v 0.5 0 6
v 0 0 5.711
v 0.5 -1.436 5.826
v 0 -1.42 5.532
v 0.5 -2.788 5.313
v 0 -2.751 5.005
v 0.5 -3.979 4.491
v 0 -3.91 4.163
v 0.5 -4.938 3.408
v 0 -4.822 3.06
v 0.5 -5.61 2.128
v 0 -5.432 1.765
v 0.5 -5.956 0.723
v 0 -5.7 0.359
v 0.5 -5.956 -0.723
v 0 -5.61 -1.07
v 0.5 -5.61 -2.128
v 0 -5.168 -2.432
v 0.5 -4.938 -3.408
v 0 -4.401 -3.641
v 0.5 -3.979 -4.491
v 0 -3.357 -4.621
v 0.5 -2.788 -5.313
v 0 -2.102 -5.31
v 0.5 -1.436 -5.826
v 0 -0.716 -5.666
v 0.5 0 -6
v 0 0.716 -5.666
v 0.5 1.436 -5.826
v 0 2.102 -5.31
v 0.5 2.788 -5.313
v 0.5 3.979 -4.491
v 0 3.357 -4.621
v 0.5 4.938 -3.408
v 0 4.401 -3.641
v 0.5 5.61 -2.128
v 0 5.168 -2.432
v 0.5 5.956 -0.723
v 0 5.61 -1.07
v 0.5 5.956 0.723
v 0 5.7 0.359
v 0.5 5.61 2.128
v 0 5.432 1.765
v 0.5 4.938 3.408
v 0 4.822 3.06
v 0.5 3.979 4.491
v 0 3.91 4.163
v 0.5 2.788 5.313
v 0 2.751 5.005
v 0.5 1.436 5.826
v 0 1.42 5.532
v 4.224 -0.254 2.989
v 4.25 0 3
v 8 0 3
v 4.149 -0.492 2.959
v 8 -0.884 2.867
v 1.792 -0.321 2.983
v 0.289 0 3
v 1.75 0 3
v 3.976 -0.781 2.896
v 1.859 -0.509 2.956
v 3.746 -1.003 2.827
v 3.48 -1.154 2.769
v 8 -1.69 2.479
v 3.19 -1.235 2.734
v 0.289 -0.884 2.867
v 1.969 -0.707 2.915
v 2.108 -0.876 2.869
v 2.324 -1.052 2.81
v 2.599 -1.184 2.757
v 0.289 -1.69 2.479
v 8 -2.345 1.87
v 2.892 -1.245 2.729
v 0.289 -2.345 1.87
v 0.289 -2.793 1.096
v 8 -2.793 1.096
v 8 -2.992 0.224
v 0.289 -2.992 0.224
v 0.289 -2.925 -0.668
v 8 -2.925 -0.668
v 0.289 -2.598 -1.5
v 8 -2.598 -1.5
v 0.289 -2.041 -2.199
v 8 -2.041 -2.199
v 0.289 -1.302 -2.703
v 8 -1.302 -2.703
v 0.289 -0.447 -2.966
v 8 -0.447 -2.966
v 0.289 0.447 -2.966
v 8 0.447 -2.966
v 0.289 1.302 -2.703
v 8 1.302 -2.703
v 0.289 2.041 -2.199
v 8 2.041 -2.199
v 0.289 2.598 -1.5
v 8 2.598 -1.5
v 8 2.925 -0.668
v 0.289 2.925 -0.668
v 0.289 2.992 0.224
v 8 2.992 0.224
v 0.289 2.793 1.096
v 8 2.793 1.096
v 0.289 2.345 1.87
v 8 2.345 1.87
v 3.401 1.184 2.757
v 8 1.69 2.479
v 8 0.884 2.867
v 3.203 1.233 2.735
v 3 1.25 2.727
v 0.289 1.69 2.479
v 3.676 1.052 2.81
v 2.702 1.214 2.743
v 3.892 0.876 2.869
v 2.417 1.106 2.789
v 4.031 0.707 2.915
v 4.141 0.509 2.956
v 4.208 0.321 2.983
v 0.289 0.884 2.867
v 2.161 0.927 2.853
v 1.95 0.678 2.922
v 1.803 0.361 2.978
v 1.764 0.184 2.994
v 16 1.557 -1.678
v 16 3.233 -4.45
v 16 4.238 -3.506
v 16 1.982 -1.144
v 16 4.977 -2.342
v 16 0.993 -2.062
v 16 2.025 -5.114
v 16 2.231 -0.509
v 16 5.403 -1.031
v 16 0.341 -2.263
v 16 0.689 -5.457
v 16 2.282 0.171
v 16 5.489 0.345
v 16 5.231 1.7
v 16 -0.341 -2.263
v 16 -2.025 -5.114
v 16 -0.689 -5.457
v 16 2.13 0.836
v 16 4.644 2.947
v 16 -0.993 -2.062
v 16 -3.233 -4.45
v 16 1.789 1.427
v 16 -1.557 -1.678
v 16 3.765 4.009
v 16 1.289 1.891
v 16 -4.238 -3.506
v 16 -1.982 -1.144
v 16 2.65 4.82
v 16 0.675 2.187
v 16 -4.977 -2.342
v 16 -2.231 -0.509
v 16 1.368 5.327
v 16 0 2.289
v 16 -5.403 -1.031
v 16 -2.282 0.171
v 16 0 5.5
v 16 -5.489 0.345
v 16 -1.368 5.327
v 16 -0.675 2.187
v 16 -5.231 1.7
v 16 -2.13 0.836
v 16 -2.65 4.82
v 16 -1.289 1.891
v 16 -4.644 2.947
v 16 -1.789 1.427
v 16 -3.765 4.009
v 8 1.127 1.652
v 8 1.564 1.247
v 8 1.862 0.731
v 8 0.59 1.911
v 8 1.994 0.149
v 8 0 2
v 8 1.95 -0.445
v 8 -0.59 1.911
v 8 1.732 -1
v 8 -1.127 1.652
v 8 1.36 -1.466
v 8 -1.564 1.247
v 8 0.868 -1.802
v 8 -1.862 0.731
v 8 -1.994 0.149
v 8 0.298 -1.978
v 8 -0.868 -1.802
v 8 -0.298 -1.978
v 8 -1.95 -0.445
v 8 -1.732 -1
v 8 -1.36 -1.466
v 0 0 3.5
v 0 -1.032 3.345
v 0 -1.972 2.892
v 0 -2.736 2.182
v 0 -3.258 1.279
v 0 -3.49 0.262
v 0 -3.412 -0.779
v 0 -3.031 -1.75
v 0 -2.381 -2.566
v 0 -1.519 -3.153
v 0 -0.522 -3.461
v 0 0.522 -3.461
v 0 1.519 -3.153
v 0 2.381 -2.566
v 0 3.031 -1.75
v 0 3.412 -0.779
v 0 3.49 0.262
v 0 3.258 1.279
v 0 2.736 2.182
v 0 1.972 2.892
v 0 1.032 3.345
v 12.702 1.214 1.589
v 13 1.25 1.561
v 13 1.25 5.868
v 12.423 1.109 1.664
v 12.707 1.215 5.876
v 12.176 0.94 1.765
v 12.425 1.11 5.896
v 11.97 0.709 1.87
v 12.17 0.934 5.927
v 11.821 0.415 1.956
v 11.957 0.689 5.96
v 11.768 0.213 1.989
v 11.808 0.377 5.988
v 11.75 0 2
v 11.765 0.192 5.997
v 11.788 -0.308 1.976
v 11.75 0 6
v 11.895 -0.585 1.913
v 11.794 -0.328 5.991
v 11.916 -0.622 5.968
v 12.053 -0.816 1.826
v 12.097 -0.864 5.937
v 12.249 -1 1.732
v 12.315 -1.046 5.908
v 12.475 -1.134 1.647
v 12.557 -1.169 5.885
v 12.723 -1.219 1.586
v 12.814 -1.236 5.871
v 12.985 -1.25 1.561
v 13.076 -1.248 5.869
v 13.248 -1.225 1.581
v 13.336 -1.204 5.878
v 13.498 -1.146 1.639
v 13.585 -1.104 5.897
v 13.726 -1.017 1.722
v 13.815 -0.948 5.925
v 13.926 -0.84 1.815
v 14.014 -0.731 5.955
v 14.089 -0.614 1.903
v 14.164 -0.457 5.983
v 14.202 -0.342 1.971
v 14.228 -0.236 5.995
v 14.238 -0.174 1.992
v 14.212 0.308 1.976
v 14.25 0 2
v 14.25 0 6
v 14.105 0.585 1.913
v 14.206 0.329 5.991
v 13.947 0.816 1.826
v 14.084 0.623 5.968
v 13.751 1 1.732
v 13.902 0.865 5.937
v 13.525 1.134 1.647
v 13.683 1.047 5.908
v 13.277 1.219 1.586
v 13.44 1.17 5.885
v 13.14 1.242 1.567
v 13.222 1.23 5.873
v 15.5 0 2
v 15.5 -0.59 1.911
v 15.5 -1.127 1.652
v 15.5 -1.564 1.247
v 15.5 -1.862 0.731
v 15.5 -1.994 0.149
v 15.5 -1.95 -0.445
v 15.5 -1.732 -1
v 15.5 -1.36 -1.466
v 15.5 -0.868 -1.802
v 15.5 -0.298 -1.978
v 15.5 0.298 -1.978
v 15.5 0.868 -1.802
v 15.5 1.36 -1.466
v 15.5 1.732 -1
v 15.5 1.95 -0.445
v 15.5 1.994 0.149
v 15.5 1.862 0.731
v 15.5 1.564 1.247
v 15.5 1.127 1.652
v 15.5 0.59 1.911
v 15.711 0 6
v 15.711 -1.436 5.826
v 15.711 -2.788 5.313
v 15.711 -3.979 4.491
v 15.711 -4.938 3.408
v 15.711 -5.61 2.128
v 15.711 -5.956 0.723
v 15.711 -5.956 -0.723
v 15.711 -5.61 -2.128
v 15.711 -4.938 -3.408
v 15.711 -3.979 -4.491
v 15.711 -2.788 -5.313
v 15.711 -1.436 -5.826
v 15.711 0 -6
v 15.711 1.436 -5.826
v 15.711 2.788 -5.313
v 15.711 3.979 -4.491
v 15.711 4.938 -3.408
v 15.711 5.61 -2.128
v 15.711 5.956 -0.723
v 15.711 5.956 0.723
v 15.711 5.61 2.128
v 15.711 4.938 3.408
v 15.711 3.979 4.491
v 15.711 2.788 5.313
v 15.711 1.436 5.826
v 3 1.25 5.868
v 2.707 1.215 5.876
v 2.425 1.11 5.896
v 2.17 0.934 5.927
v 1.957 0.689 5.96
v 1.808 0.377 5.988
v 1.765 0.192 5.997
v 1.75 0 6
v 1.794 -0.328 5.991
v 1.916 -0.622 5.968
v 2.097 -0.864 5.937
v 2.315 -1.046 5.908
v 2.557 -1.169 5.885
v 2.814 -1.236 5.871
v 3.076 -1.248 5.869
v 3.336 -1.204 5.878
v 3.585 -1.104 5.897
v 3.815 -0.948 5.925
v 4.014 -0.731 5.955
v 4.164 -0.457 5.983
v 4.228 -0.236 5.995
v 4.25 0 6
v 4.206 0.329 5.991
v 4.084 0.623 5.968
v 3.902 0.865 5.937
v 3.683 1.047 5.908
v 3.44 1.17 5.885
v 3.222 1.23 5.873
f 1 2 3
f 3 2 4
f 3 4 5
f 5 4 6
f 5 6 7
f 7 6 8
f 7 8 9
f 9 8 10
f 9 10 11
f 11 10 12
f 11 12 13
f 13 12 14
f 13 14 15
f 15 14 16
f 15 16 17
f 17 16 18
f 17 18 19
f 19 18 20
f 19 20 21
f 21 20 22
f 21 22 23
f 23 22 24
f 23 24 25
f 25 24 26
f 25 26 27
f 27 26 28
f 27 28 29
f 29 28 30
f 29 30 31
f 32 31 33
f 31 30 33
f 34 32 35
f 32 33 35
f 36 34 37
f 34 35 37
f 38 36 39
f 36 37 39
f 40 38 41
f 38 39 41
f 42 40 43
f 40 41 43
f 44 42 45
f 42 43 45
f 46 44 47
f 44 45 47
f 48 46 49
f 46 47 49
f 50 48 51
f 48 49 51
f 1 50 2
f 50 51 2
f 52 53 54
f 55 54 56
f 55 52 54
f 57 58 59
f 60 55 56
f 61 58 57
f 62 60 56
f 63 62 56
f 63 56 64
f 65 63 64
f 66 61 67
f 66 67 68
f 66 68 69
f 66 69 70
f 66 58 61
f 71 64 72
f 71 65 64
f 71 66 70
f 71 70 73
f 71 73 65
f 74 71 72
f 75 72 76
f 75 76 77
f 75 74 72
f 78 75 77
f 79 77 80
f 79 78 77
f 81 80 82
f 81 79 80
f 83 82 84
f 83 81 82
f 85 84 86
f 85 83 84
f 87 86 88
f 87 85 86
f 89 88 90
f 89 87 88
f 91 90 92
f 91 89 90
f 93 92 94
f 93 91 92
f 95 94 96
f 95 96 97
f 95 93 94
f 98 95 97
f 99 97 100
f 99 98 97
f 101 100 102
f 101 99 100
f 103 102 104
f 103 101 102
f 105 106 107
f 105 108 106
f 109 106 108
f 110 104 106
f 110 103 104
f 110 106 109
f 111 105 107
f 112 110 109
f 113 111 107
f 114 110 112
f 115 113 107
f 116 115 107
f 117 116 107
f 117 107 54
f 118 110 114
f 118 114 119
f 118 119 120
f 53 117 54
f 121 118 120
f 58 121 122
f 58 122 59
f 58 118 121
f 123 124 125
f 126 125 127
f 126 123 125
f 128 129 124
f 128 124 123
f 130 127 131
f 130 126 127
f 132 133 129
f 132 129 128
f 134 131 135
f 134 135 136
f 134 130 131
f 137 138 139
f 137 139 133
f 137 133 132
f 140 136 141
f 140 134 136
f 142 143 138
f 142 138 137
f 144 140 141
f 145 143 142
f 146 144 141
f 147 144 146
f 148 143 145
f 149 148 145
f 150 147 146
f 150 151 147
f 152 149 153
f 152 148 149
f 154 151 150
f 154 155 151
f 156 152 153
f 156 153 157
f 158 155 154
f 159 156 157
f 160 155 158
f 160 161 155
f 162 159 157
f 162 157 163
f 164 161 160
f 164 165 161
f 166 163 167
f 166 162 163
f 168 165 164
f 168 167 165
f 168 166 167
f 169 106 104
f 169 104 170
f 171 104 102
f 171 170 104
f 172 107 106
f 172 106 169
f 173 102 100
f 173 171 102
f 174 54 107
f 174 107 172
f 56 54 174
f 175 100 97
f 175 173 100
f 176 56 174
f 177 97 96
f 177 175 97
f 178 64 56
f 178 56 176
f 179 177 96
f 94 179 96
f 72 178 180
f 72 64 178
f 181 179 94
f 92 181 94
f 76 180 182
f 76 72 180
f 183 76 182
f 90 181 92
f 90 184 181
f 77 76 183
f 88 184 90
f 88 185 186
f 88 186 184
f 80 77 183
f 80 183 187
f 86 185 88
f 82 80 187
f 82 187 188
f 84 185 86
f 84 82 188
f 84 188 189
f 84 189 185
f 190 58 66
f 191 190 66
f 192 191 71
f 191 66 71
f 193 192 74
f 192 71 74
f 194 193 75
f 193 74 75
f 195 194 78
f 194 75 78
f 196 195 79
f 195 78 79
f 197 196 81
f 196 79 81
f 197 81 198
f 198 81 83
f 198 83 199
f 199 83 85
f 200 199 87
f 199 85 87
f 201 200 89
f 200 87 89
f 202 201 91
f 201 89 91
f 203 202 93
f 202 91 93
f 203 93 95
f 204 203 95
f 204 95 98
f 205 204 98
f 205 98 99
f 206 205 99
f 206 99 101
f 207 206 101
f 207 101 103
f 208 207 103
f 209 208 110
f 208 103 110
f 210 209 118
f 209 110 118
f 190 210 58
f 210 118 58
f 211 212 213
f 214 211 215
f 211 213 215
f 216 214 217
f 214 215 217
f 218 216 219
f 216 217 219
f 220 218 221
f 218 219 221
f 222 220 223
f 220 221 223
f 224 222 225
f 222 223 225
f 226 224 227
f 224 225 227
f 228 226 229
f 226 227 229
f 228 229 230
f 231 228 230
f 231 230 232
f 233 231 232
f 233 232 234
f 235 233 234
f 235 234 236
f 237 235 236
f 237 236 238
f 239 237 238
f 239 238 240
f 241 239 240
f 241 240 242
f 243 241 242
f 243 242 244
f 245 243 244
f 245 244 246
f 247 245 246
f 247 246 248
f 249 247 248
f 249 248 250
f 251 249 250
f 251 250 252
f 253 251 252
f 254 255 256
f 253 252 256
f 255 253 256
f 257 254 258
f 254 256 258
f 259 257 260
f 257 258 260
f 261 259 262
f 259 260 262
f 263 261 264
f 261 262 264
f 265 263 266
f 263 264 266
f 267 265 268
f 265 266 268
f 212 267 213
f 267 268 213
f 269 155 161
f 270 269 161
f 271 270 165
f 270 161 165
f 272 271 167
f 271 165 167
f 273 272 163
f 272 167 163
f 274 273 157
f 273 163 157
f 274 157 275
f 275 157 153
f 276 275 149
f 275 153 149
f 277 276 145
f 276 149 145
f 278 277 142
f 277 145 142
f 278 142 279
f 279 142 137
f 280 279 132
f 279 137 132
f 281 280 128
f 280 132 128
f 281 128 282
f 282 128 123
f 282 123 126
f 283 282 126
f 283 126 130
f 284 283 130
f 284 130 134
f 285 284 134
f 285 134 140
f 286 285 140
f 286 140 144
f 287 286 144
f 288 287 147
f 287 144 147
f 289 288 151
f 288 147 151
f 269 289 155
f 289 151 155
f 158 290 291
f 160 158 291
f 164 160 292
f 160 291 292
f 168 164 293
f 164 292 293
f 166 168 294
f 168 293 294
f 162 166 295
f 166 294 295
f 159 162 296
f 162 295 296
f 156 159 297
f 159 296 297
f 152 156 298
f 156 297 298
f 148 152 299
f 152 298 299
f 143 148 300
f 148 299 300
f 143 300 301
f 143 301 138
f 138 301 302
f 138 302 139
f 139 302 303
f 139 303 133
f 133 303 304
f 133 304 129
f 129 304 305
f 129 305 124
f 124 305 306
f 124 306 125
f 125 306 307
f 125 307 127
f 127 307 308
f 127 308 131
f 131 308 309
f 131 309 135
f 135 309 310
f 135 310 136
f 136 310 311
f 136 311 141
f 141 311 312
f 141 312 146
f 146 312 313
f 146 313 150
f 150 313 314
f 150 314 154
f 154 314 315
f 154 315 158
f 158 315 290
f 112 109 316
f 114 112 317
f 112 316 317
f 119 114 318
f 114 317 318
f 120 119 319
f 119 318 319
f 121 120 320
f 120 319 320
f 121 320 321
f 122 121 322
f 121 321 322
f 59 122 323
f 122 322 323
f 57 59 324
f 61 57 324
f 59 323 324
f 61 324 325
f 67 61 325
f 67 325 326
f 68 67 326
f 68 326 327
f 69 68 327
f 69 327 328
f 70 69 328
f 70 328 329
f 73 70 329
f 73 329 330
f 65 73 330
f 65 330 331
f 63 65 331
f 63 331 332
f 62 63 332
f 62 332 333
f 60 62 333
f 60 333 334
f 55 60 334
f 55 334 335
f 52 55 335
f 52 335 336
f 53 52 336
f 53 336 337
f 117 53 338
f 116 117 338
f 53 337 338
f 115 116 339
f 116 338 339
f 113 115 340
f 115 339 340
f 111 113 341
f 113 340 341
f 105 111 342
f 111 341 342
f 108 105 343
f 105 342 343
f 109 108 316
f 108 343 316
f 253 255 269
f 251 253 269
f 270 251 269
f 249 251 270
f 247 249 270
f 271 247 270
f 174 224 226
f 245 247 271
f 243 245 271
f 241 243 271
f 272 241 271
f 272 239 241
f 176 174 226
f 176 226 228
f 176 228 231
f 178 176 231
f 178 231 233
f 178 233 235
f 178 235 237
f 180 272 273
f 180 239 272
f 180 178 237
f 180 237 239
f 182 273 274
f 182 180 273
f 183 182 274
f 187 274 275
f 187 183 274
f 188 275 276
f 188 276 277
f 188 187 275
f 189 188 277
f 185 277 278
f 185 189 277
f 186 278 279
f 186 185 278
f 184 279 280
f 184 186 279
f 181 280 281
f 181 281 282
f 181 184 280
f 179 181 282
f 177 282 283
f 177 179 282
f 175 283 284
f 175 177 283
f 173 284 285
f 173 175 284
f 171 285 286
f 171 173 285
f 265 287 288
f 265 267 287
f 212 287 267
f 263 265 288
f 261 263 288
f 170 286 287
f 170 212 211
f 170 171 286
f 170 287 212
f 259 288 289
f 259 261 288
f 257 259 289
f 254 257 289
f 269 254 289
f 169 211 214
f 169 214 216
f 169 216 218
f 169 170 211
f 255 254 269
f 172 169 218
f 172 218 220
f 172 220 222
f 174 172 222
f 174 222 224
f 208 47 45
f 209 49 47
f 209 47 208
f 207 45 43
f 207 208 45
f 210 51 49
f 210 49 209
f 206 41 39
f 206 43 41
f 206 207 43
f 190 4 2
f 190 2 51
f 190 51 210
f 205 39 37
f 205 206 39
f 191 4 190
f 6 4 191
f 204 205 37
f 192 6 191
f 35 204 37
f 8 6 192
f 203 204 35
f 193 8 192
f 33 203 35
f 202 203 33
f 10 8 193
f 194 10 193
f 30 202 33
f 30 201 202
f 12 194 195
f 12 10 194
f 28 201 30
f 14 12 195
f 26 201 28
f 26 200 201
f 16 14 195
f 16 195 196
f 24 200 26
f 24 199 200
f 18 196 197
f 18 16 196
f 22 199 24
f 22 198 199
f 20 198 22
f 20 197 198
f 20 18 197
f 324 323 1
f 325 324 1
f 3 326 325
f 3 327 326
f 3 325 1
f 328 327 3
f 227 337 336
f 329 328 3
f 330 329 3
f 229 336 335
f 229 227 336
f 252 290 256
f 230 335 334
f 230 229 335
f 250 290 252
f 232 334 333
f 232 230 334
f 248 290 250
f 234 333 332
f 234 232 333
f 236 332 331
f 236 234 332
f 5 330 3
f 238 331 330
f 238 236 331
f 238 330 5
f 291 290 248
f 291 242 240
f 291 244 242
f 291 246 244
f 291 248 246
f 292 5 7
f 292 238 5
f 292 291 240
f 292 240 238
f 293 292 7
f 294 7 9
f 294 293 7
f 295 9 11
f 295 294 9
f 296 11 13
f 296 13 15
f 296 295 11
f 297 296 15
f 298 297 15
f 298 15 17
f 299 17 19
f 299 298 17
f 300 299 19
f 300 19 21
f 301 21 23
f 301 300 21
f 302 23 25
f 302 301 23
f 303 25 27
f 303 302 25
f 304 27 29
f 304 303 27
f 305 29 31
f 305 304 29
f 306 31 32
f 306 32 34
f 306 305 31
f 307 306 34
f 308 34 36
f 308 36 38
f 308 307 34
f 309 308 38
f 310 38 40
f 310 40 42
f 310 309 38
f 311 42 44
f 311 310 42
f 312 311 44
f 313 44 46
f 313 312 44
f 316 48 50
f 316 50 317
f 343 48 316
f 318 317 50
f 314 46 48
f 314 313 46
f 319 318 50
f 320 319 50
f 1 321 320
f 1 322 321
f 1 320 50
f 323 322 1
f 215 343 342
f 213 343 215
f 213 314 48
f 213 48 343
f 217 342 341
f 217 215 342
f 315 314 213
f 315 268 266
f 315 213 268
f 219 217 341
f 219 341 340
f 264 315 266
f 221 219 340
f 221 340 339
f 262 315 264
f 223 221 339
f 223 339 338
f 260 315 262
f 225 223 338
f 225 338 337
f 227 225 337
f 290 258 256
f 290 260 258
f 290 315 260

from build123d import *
from OCP.BRepFilletAPI import BRepFilletAPI_MakeChamfer

# Parameters (mm, degrees)
CHANFREIN1_SIZE            = 0.5
CHANFREIN1_SIZE2           = 0.288675135
ESQUISSE2_W                = 1.25
ESQUISSE2_H                = 6
TROU_TARAUD_M31_AT_2_COUNT = 2
TROU_TARAUD_M31_AT_2_PITCH = 10


with BuildPart() as part:
    # Esquisse1 → Révolution1 (revolve)
    with BuildSketch(Plane.XY, mode=Mode.PRIVATE) as r_volution1_sk:
        Polygon((0, 3), (0, 6), (16, 6), (16, 2), (8, 2), (8, 3), align=None)
    revolve(r_volution1_sk.sketch.rotate(Axis((0, 0, 0), (1, 0, 0)), 90), axis=Axis((0, 0, 0), (1, 0, 0)))

    # Chanfrein1: one chamfer whose edges measure the first distance from different faces: ONE call of the kernel's chamfer builder (chamfer() names one face for all edges)
    chanfrein1_edges_1 = [part.edges().sort_by_distance(p)[0] for p in [
        (16, 0, -2),
    ]]
    chanfrein1_side_1 = [part.faces().sort_by_distance(p)[0] for p in [
        (12, 0, -2),
    ]]
    chanfrein1_edges_2 = [part.edges().sort_by_distance(p)[0] for p in [
        (16, 0, -6),
    ]]
    chanfrein1_side_2 = [part.faces().sort_by_distance(p)[0] for p in [
        (16, 0, -5.830294373),
    ]]
    chanfrein1_edges_3 = [part.edges().sort_by_distance(p)[0] for p in [
        (0, 0, -6),
    ]]
    chanfrein1_side_3 = [part.faces().sort_by_distance(p)[0] for p in [
        (8, 0, -6),
    ]]
    chanfrein1_edges_4 = [part.edges().sort_by_distance(p)[0] for p in [
        (0, 0, -3),
    ]]
    chanfrein1_side_4 = [part.faces().sort_by_distance(p)[0] for p in [
        (0, 0, -3.169705627),
    ]]
    chanfrein1 = BRepFilletAPI_MakeChamfer(part.part.solid().wrapped)
    for e in chanfrein1_edges_1:
        chanfrein1.Add(CHANFREIN1_SIZE, CHANFREIN1_SIZE2, e.wrapped, chanfrein1_side_1[0].wrapped)  # the first distance lies on this face
    for e in chanfrein1_edges_2:
        chanfrein1.Add(CHANFREIN1_SIZE, CHANFREIN1_SIZE2, e.wrapped, chanfrein1_side_2[0].wrapped)  # the first distance lies on this face
    for e in chanfrein1_edges_3:
        chanfrein1.Add(CHANFREIN1_SIZE, CHANFREIN1_SIZE2, e.wrapped, chanfrein1_side_3[0].wrapped)  # the first distance lies on this face
    for e in chanfrein1_edges_4:
        chanfrein1.Add(CHANFREIN1_SIZE, CHANFREIN1_SIZE2, e.wrapped, chanfrein1_side_4[0].wrapped)  # the first distance lies on this face
    add(Compound.cast(chanfrein1.Shape()), mode=Mode.REPLACE)

    # Esquisse2 → Trou taraudé M31 (revolve, cut)
    with BuildSketch(Plane.YZ.offset(3)):
        with Locations((0.625, 3)):
            Rectangle(ESQUISSE2_W, ESQUISSE2_H)
    trou_taraud_m31 = revolve(axis=Axis((3, 0, -6.35), (0, 0, 1)), mode=Mode.SUBTRACT)

    # Trou taraudé M31 at 2: Trou taraudé M31 ×2
    with Locations(*[(i * TROU_TARAUD_M31_AT_2_PITCH, 0, 0) for i in range(1, TROU_TARAUD_M31_AT_2_COUNT)]):
        add(trou_taraud_m31, mode=Mode.SUBTRACT)


solid = part.part
